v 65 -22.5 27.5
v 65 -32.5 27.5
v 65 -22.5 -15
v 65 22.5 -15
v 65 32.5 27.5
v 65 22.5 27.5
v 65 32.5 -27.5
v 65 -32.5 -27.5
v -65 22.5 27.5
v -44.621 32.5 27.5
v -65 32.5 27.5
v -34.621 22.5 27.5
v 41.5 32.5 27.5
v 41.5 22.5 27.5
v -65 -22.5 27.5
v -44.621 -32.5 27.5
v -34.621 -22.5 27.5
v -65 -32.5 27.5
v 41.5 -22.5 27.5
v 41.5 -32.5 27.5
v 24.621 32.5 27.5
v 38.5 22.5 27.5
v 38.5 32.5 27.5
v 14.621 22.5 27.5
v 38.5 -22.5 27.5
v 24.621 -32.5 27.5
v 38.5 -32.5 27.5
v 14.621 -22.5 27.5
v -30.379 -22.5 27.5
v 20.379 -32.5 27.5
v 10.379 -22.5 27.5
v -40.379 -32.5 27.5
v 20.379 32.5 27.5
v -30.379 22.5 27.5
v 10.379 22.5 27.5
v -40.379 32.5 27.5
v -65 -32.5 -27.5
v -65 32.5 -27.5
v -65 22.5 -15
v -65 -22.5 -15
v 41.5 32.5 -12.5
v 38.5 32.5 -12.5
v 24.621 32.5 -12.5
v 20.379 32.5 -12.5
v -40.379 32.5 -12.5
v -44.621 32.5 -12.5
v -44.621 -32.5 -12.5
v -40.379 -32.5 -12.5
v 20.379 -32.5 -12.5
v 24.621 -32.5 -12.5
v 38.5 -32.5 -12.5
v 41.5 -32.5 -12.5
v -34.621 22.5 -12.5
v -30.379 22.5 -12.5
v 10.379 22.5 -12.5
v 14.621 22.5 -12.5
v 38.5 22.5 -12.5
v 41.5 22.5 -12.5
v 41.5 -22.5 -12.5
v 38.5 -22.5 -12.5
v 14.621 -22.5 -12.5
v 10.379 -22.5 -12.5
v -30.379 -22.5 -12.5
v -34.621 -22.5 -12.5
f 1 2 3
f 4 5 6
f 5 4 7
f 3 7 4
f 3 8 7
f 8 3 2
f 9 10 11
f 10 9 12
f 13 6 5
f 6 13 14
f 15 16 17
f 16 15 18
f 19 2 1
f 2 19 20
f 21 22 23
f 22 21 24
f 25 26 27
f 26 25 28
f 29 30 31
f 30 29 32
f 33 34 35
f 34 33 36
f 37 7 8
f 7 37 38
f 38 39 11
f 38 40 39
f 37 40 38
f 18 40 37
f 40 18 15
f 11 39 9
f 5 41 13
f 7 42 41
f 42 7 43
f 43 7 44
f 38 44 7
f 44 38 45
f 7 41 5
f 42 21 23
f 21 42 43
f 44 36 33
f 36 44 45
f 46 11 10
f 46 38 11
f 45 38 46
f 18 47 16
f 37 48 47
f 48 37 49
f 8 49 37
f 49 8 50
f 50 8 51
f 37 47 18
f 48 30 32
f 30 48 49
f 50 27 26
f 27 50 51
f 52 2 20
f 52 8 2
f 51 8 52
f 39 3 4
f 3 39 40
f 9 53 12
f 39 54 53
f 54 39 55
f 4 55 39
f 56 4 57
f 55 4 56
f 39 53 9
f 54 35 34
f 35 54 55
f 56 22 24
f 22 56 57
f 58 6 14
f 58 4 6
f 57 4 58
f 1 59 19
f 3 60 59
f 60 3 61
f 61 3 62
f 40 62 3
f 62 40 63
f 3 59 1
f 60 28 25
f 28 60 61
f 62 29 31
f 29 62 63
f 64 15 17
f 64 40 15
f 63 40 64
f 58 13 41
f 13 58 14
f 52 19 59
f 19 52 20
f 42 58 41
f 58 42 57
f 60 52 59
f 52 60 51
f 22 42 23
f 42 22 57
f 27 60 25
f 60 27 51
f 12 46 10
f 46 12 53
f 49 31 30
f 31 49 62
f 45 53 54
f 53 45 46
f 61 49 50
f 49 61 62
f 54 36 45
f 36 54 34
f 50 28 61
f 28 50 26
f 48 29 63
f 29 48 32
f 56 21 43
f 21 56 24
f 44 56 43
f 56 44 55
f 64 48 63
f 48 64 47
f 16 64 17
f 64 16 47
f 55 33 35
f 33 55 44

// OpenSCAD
furesz=3;
difference() {
    cube([130,65,55], center=true);
    translate([0,0,10]) cube([140,45,50], center=true);
    translate([40,0,10]) cube([furesz,200,45], center=true);
    translate([-10,0,10]) rotate([0, 0, 45]) cube([furesz,200,45], center=true);
    translate([-10,0,10]) rotate([0, 0, -45]) cube([furesz,200,45], center=true);
}
